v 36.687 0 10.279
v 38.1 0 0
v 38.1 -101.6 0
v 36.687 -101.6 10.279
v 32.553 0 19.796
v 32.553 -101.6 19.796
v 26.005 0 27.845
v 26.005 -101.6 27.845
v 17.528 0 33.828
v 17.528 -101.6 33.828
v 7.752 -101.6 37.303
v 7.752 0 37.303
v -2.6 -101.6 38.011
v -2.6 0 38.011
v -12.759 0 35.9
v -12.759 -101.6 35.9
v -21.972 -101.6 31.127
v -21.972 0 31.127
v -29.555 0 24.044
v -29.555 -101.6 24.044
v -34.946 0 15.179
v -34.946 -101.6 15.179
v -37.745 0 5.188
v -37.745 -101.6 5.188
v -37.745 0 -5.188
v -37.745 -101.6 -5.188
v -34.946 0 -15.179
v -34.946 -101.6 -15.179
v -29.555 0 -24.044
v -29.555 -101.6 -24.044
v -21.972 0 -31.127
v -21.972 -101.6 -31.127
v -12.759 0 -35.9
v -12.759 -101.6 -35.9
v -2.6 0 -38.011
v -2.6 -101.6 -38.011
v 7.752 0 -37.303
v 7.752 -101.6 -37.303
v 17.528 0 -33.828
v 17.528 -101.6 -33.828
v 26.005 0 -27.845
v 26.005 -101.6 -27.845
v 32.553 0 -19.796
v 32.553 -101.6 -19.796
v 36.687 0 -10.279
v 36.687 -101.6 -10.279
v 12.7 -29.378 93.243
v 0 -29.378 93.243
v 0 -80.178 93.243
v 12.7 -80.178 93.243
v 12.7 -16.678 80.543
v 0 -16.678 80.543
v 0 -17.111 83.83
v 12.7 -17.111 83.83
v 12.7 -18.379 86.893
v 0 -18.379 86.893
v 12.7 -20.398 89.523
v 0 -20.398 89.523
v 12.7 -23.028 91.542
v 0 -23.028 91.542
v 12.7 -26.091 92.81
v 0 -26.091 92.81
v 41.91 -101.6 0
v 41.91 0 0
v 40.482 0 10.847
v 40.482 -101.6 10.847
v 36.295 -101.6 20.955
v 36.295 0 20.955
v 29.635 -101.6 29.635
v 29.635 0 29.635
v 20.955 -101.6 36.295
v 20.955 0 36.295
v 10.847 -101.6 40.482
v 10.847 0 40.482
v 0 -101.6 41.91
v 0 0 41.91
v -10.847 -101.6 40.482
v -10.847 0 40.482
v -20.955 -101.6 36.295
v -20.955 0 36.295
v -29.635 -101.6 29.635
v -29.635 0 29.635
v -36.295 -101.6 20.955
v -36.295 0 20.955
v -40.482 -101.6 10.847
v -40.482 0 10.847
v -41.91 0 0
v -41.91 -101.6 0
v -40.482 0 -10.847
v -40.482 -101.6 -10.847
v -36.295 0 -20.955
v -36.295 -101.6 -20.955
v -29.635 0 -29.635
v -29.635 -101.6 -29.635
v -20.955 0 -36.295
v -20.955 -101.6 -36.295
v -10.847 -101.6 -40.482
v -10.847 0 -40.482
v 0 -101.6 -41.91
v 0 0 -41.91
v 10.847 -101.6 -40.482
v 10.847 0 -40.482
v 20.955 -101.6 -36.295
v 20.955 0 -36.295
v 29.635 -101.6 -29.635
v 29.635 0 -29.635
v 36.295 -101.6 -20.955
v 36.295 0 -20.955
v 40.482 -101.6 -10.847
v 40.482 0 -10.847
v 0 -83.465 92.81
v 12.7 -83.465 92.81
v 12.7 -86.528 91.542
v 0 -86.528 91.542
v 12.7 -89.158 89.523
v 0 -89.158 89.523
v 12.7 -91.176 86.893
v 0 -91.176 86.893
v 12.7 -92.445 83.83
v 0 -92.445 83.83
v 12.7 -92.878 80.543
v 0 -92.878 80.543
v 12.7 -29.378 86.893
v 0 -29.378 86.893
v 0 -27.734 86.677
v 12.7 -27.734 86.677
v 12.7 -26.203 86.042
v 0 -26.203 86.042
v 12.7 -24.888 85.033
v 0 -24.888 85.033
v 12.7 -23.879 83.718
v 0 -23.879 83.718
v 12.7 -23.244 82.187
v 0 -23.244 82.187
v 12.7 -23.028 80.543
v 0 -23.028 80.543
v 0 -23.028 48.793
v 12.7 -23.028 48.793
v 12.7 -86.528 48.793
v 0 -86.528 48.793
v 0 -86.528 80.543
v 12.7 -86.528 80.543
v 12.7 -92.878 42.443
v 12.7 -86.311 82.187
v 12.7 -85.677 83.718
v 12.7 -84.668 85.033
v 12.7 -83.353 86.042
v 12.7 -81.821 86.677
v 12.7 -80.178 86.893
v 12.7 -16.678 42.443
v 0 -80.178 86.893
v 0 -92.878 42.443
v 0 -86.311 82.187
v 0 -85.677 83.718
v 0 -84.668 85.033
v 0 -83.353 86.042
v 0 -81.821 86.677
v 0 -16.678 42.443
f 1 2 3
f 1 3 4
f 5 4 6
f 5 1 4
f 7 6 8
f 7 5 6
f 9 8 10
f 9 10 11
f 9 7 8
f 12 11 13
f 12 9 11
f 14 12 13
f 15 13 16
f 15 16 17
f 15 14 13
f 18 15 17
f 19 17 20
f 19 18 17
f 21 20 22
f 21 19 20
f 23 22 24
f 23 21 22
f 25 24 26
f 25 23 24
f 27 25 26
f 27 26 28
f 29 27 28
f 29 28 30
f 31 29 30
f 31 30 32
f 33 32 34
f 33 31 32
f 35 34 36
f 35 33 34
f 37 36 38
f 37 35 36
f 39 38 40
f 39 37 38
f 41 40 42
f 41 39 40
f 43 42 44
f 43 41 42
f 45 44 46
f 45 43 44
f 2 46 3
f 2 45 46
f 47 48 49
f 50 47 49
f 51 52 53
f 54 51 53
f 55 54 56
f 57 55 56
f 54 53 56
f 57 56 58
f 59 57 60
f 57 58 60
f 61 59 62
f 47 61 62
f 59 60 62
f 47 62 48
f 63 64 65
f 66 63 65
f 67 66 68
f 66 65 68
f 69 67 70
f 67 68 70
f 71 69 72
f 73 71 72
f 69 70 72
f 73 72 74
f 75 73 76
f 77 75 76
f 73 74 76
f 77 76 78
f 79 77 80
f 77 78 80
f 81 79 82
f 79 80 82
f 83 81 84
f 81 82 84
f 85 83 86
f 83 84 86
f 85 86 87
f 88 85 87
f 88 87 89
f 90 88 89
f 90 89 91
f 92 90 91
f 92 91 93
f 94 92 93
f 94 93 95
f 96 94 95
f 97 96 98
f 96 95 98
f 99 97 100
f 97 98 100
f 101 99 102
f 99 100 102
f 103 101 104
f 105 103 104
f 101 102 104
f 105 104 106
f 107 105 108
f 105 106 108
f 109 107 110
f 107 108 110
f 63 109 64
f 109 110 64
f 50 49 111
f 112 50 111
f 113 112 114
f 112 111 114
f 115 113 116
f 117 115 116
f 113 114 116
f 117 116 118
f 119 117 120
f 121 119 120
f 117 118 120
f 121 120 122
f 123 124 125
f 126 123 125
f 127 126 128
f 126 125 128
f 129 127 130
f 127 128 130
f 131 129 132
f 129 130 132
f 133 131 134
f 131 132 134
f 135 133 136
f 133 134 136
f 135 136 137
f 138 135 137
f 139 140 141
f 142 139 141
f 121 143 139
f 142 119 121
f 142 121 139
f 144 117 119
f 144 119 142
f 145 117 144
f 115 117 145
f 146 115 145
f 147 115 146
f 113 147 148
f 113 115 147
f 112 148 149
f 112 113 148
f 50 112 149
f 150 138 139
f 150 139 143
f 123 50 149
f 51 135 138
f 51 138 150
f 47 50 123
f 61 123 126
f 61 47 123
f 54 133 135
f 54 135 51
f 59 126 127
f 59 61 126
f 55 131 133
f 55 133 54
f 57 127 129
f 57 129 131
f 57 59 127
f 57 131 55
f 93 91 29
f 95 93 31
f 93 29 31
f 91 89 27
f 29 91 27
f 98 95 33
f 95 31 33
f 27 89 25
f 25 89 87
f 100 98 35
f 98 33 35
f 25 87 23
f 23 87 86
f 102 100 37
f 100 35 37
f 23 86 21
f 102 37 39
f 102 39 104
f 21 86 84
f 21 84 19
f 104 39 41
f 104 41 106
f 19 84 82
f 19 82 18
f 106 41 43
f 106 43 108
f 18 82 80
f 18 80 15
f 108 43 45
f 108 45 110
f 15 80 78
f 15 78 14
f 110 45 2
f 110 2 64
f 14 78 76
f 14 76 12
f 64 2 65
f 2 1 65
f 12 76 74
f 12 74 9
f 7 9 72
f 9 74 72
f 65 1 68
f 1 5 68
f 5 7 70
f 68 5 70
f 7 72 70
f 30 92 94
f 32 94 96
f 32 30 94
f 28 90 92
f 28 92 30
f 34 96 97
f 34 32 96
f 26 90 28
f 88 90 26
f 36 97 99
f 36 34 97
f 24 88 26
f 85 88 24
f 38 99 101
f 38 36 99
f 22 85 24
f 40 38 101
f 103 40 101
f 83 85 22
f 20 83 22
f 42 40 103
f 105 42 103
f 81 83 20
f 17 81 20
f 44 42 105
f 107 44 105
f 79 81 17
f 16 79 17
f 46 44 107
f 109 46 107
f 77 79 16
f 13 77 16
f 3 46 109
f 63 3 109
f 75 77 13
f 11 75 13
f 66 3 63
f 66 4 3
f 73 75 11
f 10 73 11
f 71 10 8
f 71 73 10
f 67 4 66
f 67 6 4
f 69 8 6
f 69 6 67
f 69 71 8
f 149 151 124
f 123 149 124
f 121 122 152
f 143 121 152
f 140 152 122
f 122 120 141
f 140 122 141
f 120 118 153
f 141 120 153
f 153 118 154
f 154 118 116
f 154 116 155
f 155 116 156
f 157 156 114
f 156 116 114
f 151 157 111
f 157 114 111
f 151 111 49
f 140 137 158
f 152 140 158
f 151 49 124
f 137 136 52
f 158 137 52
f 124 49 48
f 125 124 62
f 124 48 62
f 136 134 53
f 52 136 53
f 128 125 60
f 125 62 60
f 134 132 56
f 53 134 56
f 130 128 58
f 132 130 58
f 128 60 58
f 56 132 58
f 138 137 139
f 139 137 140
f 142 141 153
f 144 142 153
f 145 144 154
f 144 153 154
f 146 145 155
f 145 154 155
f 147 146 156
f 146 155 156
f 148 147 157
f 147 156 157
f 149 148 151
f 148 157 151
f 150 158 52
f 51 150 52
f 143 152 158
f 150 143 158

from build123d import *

# Parameters (mm, degrees)
F0_R     = 41.91
F0_R_2   = 38.1
F1_DEPTH = 101.6
F3_DEPTH = 12.7


with BuildPart() as f1:
    # F0 (on Front) → F1 (new body)
    with BuildSketch(Plane.XZ):
        Circle(F0_R)
        Circle(F0_R_2, mode=Mode.SUBTRACT)
    extrude(amount=F1_DEPTH)


with BuildPart() as f3:
    # F2 (on Right) → F3 (new body)
    with BuildSketch(Plane.YZ):
        with BuildLine():
            Line((-92.877778, 80.543227), (-92.877778, 42.443227))
            Line((-92.877778, 42.443227), (-16.677778, 42.443227))
            Line((-16.677778, 42.443227), (-16.677778, 80.543227))
            ThreePointArc((-16.677778, 80.543227), (-20.397522, 89.523483), (-29.377778, 93.243227))
            Line((-29.377778, 93.243227), (-80.177778, 93.243227))
            ThreePointArc((-80.177778, 93.243227), (-89.158034, 89.523483), (-92.877778, 80.543227))
        make_face()
        with BuildLine():
            ThreePointArc((-86.527778, 80.543227), (-84.667906, 85.033355), (-80.177778, 86.893227))
            Line((-80.177778, 86.893227), (-29.377778, 86.893227))
            ThreePointArc((-29.377778, 86.893227), (-24.88765, 85.033355), (-23.027778, 80.543227))
            Line((-23.027778, 80.543227), (-23.027778, 48.793227))
            Line((-23.027778, 48.793227), (-86.527778, 48.793227))
            Line((-86.527778, 48.793227), (-86.527778, 80.543227))
        make_face(mode=Mode.SUBTRACT)
    extrude(amount=F3_DEPTH)


solid = Compound([f1.part, f3.part])
